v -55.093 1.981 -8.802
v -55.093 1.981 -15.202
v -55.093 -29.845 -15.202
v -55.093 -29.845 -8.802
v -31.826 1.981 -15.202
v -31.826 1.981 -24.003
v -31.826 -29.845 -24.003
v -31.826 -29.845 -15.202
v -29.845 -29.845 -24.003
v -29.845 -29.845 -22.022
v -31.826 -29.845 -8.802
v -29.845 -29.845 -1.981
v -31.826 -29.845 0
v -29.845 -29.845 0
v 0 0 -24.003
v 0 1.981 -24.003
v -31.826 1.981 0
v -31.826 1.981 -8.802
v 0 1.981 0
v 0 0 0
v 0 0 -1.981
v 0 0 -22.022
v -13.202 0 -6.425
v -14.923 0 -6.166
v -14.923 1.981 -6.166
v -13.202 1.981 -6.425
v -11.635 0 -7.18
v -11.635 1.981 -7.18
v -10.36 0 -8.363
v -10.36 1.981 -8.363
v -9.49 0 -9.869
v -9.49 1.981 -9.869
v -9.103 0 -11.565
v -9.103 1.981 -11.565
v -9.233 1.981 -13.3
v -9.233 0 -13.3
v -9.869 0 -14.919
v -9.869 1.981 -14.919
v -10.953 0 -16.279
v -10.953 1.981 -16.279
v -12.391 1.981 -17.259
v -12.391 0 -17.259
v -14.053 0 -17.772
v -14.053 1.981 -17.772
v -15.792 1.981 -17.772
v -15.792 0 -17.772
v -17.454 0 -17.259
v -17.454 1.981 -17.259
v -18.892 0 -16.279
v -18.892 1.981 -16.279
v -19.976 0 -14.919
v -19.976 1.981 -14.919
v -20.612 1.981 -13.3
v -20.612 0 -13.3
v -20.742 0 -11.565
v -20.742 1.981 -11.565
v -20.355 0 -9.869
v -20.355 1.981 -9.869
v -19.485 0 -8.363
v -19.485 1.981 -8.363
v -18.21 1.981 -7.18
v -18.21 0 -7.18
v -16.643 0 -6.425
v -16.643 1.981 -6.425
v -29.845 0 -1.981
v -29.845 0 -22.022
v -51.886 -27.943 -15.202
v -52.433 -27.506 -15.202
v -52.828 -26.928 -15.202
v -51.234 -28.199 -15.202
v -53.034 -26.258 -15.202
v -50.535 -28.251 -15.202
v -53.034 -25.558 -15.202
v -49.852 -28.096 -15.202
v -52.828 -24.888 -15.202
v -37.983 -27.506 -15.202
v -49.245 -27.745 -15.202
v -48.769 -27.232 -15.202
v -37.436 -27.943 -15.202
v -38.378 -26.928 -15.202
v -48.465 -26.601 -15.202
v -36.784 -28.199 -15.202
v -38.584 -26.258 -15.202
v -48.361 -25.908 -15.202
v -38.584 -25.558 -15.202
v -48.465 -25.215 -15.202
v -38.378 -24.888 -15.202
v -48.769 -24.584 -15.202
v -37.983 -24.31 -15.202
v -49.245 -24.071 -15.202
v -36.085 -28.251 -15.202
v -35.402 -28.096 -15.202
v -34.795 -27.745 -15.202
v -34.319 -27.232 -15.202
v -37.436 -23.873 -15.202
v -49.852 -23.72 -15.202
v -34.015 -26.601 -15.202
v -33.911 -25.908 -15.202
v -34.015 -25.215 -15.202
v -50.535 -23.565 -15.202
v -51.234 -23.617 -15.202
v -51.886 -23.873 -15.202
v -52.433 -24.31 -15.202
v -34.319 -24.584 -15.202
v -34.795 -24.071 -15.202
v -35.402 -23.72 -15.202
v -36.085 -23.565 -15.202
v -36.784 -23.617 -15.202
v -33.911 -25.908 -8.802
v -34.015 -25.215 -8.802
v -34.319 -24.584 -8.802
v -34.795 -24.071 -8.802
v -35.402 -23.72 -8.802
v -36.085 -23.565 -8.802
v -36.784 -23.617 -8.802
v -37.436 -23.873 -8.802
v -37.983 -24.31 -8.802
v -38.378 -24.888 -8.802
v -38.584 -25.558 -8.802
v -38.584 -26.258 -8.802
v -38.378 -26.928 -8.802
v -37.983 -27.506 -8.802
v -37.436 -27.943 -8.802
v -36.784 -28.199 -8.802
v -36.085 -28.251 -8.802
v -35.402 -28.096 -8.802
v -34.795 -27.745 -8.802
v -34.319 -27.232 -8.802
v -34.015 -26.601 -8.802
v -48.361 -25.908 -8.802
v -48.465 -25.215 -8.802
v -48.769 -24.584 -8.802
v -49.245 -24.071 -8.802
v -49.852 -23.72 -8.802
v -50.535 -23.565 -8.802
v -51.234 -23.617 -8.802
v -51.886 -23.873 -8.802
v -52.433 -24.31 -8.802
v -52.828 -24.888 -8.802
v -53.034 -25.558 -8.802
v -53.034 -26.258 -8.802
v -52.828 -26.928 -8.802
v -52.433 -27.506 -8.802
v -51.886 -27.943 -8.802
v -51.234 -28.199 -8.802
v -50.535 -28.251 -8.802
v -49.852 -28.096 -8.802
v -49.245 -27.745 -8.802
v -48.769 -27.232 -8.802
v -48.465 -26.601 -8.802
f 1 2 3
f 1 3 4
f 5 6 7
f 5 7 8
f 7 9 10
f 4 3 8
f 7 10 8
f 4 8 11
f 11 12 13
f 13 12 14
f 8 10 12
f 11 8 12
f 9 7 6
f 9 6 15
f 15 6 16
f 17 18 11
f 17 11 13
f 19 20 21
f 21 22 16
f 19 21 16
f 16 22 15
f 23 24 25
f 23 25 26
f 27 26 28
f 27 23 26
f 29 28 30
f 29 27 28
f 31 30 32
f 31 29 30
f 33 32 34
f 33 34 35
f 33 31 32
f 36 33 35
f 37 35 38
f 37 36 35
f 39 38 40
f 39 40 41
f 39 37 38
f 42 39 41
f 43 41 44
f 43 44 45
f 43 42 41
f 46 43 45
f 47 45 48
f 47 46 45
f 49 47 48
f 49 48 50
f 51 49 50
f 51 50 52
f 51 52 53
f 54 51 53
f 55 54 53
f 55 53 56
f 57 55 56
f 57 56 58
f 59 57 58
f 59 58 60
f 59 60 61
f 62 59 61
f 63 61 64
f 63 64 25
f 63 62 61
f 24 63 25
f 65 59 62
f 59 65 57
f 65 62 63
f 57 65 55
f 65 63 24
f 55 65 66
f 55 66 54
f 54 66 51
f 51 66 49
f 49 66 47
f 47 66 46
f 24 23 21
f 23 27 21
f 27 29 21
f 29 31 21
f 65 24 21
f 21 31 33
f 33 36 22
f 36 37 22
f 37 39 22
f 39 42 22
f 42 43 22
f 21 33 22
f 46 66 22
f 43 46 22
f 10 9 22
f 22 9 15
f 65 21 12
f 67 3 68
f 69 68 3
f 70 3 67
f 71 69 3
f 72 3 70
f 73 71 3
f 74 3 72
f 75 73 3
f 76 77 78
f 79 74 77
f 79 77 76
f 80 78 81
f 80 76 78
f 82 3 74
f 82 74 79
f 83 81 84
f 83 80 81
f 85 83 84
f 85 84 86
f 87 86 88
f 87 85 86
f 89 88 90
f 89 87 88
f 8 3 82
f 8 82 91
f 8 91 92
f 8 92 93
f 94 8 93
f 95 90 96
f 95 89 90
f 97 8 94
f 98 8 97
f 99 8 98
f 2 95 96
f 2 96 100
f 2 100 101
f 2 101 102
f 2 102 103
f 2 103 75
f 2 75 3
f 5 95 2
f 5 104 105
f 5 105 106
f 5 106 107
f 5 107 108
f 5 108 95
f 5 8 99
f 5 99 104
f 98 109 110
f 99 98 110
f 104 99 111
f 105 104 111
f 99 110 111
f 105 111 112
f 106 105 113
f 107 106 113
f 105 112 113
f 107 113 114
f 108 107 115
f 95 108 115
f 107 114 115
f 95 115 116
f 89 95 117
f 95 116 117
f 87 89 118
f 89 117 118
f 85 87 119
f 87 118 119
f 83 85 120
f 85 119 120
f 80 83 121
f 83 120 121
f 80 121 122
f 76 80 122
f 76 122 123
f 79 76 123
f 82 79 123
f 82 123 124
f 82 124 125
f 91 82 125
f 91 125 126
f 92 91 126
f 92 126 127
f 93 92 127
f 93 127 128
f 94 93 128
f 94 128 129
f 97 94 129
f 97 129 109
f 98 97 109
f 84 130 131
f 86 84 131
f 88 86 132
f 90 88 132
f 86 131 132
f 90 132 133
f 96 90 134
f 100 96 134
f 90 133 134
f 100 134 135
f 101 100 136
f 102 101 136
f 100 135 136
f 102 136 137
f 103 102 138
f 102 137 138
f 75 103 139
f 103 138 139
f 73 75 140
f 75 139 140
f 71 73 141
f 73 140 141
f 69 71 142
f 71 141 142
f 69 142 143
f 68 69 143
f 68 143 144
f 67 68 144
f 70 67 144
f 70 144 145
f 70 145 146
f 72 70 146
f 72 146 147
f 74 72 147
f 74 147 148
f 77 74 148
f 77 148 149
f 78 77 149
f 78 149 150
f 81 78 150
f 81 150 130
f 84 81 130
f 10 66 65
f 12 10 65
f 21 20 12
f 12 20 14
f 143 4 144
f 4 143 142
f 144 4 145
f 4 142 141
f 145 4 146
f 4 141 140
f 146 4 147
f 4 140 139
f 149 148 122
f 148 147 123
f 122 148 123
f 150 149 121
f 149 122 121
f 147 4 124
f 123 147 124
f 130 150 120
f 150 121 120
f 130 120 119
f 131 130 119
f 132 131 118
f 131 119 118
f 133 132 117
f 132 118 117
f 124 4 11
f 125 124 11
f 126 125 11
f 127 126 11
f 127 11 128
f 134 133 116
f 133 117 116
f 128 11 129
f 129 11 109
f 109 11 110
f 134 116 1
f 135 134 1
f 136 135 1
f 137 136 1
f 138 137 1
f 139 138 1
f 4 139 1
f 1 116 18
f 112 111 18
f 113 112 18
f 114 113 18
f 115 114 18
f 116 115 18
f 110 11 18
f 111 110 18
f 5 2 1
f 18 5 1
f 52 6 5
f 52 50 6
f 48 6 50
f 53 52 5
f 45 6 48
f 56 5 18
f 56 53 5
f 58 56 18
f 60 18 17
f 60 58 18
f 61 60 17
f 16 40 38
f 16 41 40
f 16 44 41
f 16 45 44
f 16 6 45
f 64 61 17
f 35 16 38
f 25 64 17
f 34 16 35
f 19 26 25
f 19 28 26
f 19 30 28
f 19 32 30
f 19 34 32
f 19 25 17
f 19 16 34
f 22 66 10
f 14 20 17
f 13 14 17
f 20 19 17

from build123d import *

# Parameters (mm, degrees)
SKETCH1_W           = 29.845
SKETCH1_H           = 24.003
SKETCH1_R           = 5.83565
BOSS_EXTRUDE1_DEPTH = 1.9812
SKETCH7_W           = 24.003
SKETCH7_H           = 31.8262
BOSS_EXTRUDE4_DEPTH = 1.9812
BOSS_EXTRUDE5_DEPTH = 1.9812
BOSS_EXTRUDE6_DEPTH = 1.9812
SKETCH10_W          = 6.4
SKETCH10_H          = 31.8262
BOSS_EXTRUDE7_DEPTH = 23.2664
SKETCH11_R          = 2.349999999
CUT_EXTRUDE1_DEPTH  = 65.474833866


with BuildPart() as part:
    # Sketch1 → Boss-Extrude1 (new body)
    with BuildSketch(Plane(origin=(0, 0, 0), x_dir=(1, 0, 0), z_dir=(0, 1, 0))):
        with Locations((-14.9225, 12.0015)):
            Rectangle(SKETCH1_W, SKETCH1_H)
        with Locations(Location((-14.9225, 12.0015, 0), (0, 0, 270))):
            Circle(SKETCH1_R, mode=Mode.SUBTRACT)
    extrude(amount=BOSS_EXTRUDE1_DEPTH)

    # Sketch7 → Boss-Extrude4 (add)
    with BuildSketch(Plane.ZY.offset(29.845)):
        with Locations((-12.0015, -13.9319)):
            Rectangle(SKETCH7_W, SKETCH7_H)
    extrude(amount=BOSS_EXTRUDE4_DEPTH)

    # Sketch8 → Boss-Extrude5 (add)
    with BuildSketch(Plane.XY):
        Polygon((-29.845, -29.845), (-29.845, 0), (0, 0), align=None)
    extrude(amount=-BOSS_EXTRUDE5_DEPTH)

    # Sketch9 → Boss-Extrude6 (add)
    with BuildSketch(Plane(origin=(0, 0, -24.003), x_dir=(-1, 0, 0), z_dir=(0, 0, -1))):
        Polygon((0, 0), (29.845, 0), (29.845, -29.845), align=None)
    extrude(amount=-BOSS_EXTRUDE6_DEPTH)

    # Sketch10 → Boss-Extrude7 (add)
    with BuildSketch(Plane.ZY.offset(31.8262)):
        with Locations((-12.0015, -13.9319)):
            Rectangle(SKETCH10_W, SKETCH10_H)
    extrude(amount=BOSS_EXTRUDE7_DEPTH)

    # Sketch11 → Cut-Extrude1 (cut, through all)
    with BuildSketch(Plane.XY.offset(-8.8015)):
        with Locations((-50.710600001, -25.908)):
            Circle(SKETCH11_R)
        with Locations((-36.260599945, -25.908)):
            Circle(SKETCH11_R)
    extrude(amount=-CUT_EXTRUDE1_DEPTH, mode=Mode.SUBTRACT)


solid = part.part
